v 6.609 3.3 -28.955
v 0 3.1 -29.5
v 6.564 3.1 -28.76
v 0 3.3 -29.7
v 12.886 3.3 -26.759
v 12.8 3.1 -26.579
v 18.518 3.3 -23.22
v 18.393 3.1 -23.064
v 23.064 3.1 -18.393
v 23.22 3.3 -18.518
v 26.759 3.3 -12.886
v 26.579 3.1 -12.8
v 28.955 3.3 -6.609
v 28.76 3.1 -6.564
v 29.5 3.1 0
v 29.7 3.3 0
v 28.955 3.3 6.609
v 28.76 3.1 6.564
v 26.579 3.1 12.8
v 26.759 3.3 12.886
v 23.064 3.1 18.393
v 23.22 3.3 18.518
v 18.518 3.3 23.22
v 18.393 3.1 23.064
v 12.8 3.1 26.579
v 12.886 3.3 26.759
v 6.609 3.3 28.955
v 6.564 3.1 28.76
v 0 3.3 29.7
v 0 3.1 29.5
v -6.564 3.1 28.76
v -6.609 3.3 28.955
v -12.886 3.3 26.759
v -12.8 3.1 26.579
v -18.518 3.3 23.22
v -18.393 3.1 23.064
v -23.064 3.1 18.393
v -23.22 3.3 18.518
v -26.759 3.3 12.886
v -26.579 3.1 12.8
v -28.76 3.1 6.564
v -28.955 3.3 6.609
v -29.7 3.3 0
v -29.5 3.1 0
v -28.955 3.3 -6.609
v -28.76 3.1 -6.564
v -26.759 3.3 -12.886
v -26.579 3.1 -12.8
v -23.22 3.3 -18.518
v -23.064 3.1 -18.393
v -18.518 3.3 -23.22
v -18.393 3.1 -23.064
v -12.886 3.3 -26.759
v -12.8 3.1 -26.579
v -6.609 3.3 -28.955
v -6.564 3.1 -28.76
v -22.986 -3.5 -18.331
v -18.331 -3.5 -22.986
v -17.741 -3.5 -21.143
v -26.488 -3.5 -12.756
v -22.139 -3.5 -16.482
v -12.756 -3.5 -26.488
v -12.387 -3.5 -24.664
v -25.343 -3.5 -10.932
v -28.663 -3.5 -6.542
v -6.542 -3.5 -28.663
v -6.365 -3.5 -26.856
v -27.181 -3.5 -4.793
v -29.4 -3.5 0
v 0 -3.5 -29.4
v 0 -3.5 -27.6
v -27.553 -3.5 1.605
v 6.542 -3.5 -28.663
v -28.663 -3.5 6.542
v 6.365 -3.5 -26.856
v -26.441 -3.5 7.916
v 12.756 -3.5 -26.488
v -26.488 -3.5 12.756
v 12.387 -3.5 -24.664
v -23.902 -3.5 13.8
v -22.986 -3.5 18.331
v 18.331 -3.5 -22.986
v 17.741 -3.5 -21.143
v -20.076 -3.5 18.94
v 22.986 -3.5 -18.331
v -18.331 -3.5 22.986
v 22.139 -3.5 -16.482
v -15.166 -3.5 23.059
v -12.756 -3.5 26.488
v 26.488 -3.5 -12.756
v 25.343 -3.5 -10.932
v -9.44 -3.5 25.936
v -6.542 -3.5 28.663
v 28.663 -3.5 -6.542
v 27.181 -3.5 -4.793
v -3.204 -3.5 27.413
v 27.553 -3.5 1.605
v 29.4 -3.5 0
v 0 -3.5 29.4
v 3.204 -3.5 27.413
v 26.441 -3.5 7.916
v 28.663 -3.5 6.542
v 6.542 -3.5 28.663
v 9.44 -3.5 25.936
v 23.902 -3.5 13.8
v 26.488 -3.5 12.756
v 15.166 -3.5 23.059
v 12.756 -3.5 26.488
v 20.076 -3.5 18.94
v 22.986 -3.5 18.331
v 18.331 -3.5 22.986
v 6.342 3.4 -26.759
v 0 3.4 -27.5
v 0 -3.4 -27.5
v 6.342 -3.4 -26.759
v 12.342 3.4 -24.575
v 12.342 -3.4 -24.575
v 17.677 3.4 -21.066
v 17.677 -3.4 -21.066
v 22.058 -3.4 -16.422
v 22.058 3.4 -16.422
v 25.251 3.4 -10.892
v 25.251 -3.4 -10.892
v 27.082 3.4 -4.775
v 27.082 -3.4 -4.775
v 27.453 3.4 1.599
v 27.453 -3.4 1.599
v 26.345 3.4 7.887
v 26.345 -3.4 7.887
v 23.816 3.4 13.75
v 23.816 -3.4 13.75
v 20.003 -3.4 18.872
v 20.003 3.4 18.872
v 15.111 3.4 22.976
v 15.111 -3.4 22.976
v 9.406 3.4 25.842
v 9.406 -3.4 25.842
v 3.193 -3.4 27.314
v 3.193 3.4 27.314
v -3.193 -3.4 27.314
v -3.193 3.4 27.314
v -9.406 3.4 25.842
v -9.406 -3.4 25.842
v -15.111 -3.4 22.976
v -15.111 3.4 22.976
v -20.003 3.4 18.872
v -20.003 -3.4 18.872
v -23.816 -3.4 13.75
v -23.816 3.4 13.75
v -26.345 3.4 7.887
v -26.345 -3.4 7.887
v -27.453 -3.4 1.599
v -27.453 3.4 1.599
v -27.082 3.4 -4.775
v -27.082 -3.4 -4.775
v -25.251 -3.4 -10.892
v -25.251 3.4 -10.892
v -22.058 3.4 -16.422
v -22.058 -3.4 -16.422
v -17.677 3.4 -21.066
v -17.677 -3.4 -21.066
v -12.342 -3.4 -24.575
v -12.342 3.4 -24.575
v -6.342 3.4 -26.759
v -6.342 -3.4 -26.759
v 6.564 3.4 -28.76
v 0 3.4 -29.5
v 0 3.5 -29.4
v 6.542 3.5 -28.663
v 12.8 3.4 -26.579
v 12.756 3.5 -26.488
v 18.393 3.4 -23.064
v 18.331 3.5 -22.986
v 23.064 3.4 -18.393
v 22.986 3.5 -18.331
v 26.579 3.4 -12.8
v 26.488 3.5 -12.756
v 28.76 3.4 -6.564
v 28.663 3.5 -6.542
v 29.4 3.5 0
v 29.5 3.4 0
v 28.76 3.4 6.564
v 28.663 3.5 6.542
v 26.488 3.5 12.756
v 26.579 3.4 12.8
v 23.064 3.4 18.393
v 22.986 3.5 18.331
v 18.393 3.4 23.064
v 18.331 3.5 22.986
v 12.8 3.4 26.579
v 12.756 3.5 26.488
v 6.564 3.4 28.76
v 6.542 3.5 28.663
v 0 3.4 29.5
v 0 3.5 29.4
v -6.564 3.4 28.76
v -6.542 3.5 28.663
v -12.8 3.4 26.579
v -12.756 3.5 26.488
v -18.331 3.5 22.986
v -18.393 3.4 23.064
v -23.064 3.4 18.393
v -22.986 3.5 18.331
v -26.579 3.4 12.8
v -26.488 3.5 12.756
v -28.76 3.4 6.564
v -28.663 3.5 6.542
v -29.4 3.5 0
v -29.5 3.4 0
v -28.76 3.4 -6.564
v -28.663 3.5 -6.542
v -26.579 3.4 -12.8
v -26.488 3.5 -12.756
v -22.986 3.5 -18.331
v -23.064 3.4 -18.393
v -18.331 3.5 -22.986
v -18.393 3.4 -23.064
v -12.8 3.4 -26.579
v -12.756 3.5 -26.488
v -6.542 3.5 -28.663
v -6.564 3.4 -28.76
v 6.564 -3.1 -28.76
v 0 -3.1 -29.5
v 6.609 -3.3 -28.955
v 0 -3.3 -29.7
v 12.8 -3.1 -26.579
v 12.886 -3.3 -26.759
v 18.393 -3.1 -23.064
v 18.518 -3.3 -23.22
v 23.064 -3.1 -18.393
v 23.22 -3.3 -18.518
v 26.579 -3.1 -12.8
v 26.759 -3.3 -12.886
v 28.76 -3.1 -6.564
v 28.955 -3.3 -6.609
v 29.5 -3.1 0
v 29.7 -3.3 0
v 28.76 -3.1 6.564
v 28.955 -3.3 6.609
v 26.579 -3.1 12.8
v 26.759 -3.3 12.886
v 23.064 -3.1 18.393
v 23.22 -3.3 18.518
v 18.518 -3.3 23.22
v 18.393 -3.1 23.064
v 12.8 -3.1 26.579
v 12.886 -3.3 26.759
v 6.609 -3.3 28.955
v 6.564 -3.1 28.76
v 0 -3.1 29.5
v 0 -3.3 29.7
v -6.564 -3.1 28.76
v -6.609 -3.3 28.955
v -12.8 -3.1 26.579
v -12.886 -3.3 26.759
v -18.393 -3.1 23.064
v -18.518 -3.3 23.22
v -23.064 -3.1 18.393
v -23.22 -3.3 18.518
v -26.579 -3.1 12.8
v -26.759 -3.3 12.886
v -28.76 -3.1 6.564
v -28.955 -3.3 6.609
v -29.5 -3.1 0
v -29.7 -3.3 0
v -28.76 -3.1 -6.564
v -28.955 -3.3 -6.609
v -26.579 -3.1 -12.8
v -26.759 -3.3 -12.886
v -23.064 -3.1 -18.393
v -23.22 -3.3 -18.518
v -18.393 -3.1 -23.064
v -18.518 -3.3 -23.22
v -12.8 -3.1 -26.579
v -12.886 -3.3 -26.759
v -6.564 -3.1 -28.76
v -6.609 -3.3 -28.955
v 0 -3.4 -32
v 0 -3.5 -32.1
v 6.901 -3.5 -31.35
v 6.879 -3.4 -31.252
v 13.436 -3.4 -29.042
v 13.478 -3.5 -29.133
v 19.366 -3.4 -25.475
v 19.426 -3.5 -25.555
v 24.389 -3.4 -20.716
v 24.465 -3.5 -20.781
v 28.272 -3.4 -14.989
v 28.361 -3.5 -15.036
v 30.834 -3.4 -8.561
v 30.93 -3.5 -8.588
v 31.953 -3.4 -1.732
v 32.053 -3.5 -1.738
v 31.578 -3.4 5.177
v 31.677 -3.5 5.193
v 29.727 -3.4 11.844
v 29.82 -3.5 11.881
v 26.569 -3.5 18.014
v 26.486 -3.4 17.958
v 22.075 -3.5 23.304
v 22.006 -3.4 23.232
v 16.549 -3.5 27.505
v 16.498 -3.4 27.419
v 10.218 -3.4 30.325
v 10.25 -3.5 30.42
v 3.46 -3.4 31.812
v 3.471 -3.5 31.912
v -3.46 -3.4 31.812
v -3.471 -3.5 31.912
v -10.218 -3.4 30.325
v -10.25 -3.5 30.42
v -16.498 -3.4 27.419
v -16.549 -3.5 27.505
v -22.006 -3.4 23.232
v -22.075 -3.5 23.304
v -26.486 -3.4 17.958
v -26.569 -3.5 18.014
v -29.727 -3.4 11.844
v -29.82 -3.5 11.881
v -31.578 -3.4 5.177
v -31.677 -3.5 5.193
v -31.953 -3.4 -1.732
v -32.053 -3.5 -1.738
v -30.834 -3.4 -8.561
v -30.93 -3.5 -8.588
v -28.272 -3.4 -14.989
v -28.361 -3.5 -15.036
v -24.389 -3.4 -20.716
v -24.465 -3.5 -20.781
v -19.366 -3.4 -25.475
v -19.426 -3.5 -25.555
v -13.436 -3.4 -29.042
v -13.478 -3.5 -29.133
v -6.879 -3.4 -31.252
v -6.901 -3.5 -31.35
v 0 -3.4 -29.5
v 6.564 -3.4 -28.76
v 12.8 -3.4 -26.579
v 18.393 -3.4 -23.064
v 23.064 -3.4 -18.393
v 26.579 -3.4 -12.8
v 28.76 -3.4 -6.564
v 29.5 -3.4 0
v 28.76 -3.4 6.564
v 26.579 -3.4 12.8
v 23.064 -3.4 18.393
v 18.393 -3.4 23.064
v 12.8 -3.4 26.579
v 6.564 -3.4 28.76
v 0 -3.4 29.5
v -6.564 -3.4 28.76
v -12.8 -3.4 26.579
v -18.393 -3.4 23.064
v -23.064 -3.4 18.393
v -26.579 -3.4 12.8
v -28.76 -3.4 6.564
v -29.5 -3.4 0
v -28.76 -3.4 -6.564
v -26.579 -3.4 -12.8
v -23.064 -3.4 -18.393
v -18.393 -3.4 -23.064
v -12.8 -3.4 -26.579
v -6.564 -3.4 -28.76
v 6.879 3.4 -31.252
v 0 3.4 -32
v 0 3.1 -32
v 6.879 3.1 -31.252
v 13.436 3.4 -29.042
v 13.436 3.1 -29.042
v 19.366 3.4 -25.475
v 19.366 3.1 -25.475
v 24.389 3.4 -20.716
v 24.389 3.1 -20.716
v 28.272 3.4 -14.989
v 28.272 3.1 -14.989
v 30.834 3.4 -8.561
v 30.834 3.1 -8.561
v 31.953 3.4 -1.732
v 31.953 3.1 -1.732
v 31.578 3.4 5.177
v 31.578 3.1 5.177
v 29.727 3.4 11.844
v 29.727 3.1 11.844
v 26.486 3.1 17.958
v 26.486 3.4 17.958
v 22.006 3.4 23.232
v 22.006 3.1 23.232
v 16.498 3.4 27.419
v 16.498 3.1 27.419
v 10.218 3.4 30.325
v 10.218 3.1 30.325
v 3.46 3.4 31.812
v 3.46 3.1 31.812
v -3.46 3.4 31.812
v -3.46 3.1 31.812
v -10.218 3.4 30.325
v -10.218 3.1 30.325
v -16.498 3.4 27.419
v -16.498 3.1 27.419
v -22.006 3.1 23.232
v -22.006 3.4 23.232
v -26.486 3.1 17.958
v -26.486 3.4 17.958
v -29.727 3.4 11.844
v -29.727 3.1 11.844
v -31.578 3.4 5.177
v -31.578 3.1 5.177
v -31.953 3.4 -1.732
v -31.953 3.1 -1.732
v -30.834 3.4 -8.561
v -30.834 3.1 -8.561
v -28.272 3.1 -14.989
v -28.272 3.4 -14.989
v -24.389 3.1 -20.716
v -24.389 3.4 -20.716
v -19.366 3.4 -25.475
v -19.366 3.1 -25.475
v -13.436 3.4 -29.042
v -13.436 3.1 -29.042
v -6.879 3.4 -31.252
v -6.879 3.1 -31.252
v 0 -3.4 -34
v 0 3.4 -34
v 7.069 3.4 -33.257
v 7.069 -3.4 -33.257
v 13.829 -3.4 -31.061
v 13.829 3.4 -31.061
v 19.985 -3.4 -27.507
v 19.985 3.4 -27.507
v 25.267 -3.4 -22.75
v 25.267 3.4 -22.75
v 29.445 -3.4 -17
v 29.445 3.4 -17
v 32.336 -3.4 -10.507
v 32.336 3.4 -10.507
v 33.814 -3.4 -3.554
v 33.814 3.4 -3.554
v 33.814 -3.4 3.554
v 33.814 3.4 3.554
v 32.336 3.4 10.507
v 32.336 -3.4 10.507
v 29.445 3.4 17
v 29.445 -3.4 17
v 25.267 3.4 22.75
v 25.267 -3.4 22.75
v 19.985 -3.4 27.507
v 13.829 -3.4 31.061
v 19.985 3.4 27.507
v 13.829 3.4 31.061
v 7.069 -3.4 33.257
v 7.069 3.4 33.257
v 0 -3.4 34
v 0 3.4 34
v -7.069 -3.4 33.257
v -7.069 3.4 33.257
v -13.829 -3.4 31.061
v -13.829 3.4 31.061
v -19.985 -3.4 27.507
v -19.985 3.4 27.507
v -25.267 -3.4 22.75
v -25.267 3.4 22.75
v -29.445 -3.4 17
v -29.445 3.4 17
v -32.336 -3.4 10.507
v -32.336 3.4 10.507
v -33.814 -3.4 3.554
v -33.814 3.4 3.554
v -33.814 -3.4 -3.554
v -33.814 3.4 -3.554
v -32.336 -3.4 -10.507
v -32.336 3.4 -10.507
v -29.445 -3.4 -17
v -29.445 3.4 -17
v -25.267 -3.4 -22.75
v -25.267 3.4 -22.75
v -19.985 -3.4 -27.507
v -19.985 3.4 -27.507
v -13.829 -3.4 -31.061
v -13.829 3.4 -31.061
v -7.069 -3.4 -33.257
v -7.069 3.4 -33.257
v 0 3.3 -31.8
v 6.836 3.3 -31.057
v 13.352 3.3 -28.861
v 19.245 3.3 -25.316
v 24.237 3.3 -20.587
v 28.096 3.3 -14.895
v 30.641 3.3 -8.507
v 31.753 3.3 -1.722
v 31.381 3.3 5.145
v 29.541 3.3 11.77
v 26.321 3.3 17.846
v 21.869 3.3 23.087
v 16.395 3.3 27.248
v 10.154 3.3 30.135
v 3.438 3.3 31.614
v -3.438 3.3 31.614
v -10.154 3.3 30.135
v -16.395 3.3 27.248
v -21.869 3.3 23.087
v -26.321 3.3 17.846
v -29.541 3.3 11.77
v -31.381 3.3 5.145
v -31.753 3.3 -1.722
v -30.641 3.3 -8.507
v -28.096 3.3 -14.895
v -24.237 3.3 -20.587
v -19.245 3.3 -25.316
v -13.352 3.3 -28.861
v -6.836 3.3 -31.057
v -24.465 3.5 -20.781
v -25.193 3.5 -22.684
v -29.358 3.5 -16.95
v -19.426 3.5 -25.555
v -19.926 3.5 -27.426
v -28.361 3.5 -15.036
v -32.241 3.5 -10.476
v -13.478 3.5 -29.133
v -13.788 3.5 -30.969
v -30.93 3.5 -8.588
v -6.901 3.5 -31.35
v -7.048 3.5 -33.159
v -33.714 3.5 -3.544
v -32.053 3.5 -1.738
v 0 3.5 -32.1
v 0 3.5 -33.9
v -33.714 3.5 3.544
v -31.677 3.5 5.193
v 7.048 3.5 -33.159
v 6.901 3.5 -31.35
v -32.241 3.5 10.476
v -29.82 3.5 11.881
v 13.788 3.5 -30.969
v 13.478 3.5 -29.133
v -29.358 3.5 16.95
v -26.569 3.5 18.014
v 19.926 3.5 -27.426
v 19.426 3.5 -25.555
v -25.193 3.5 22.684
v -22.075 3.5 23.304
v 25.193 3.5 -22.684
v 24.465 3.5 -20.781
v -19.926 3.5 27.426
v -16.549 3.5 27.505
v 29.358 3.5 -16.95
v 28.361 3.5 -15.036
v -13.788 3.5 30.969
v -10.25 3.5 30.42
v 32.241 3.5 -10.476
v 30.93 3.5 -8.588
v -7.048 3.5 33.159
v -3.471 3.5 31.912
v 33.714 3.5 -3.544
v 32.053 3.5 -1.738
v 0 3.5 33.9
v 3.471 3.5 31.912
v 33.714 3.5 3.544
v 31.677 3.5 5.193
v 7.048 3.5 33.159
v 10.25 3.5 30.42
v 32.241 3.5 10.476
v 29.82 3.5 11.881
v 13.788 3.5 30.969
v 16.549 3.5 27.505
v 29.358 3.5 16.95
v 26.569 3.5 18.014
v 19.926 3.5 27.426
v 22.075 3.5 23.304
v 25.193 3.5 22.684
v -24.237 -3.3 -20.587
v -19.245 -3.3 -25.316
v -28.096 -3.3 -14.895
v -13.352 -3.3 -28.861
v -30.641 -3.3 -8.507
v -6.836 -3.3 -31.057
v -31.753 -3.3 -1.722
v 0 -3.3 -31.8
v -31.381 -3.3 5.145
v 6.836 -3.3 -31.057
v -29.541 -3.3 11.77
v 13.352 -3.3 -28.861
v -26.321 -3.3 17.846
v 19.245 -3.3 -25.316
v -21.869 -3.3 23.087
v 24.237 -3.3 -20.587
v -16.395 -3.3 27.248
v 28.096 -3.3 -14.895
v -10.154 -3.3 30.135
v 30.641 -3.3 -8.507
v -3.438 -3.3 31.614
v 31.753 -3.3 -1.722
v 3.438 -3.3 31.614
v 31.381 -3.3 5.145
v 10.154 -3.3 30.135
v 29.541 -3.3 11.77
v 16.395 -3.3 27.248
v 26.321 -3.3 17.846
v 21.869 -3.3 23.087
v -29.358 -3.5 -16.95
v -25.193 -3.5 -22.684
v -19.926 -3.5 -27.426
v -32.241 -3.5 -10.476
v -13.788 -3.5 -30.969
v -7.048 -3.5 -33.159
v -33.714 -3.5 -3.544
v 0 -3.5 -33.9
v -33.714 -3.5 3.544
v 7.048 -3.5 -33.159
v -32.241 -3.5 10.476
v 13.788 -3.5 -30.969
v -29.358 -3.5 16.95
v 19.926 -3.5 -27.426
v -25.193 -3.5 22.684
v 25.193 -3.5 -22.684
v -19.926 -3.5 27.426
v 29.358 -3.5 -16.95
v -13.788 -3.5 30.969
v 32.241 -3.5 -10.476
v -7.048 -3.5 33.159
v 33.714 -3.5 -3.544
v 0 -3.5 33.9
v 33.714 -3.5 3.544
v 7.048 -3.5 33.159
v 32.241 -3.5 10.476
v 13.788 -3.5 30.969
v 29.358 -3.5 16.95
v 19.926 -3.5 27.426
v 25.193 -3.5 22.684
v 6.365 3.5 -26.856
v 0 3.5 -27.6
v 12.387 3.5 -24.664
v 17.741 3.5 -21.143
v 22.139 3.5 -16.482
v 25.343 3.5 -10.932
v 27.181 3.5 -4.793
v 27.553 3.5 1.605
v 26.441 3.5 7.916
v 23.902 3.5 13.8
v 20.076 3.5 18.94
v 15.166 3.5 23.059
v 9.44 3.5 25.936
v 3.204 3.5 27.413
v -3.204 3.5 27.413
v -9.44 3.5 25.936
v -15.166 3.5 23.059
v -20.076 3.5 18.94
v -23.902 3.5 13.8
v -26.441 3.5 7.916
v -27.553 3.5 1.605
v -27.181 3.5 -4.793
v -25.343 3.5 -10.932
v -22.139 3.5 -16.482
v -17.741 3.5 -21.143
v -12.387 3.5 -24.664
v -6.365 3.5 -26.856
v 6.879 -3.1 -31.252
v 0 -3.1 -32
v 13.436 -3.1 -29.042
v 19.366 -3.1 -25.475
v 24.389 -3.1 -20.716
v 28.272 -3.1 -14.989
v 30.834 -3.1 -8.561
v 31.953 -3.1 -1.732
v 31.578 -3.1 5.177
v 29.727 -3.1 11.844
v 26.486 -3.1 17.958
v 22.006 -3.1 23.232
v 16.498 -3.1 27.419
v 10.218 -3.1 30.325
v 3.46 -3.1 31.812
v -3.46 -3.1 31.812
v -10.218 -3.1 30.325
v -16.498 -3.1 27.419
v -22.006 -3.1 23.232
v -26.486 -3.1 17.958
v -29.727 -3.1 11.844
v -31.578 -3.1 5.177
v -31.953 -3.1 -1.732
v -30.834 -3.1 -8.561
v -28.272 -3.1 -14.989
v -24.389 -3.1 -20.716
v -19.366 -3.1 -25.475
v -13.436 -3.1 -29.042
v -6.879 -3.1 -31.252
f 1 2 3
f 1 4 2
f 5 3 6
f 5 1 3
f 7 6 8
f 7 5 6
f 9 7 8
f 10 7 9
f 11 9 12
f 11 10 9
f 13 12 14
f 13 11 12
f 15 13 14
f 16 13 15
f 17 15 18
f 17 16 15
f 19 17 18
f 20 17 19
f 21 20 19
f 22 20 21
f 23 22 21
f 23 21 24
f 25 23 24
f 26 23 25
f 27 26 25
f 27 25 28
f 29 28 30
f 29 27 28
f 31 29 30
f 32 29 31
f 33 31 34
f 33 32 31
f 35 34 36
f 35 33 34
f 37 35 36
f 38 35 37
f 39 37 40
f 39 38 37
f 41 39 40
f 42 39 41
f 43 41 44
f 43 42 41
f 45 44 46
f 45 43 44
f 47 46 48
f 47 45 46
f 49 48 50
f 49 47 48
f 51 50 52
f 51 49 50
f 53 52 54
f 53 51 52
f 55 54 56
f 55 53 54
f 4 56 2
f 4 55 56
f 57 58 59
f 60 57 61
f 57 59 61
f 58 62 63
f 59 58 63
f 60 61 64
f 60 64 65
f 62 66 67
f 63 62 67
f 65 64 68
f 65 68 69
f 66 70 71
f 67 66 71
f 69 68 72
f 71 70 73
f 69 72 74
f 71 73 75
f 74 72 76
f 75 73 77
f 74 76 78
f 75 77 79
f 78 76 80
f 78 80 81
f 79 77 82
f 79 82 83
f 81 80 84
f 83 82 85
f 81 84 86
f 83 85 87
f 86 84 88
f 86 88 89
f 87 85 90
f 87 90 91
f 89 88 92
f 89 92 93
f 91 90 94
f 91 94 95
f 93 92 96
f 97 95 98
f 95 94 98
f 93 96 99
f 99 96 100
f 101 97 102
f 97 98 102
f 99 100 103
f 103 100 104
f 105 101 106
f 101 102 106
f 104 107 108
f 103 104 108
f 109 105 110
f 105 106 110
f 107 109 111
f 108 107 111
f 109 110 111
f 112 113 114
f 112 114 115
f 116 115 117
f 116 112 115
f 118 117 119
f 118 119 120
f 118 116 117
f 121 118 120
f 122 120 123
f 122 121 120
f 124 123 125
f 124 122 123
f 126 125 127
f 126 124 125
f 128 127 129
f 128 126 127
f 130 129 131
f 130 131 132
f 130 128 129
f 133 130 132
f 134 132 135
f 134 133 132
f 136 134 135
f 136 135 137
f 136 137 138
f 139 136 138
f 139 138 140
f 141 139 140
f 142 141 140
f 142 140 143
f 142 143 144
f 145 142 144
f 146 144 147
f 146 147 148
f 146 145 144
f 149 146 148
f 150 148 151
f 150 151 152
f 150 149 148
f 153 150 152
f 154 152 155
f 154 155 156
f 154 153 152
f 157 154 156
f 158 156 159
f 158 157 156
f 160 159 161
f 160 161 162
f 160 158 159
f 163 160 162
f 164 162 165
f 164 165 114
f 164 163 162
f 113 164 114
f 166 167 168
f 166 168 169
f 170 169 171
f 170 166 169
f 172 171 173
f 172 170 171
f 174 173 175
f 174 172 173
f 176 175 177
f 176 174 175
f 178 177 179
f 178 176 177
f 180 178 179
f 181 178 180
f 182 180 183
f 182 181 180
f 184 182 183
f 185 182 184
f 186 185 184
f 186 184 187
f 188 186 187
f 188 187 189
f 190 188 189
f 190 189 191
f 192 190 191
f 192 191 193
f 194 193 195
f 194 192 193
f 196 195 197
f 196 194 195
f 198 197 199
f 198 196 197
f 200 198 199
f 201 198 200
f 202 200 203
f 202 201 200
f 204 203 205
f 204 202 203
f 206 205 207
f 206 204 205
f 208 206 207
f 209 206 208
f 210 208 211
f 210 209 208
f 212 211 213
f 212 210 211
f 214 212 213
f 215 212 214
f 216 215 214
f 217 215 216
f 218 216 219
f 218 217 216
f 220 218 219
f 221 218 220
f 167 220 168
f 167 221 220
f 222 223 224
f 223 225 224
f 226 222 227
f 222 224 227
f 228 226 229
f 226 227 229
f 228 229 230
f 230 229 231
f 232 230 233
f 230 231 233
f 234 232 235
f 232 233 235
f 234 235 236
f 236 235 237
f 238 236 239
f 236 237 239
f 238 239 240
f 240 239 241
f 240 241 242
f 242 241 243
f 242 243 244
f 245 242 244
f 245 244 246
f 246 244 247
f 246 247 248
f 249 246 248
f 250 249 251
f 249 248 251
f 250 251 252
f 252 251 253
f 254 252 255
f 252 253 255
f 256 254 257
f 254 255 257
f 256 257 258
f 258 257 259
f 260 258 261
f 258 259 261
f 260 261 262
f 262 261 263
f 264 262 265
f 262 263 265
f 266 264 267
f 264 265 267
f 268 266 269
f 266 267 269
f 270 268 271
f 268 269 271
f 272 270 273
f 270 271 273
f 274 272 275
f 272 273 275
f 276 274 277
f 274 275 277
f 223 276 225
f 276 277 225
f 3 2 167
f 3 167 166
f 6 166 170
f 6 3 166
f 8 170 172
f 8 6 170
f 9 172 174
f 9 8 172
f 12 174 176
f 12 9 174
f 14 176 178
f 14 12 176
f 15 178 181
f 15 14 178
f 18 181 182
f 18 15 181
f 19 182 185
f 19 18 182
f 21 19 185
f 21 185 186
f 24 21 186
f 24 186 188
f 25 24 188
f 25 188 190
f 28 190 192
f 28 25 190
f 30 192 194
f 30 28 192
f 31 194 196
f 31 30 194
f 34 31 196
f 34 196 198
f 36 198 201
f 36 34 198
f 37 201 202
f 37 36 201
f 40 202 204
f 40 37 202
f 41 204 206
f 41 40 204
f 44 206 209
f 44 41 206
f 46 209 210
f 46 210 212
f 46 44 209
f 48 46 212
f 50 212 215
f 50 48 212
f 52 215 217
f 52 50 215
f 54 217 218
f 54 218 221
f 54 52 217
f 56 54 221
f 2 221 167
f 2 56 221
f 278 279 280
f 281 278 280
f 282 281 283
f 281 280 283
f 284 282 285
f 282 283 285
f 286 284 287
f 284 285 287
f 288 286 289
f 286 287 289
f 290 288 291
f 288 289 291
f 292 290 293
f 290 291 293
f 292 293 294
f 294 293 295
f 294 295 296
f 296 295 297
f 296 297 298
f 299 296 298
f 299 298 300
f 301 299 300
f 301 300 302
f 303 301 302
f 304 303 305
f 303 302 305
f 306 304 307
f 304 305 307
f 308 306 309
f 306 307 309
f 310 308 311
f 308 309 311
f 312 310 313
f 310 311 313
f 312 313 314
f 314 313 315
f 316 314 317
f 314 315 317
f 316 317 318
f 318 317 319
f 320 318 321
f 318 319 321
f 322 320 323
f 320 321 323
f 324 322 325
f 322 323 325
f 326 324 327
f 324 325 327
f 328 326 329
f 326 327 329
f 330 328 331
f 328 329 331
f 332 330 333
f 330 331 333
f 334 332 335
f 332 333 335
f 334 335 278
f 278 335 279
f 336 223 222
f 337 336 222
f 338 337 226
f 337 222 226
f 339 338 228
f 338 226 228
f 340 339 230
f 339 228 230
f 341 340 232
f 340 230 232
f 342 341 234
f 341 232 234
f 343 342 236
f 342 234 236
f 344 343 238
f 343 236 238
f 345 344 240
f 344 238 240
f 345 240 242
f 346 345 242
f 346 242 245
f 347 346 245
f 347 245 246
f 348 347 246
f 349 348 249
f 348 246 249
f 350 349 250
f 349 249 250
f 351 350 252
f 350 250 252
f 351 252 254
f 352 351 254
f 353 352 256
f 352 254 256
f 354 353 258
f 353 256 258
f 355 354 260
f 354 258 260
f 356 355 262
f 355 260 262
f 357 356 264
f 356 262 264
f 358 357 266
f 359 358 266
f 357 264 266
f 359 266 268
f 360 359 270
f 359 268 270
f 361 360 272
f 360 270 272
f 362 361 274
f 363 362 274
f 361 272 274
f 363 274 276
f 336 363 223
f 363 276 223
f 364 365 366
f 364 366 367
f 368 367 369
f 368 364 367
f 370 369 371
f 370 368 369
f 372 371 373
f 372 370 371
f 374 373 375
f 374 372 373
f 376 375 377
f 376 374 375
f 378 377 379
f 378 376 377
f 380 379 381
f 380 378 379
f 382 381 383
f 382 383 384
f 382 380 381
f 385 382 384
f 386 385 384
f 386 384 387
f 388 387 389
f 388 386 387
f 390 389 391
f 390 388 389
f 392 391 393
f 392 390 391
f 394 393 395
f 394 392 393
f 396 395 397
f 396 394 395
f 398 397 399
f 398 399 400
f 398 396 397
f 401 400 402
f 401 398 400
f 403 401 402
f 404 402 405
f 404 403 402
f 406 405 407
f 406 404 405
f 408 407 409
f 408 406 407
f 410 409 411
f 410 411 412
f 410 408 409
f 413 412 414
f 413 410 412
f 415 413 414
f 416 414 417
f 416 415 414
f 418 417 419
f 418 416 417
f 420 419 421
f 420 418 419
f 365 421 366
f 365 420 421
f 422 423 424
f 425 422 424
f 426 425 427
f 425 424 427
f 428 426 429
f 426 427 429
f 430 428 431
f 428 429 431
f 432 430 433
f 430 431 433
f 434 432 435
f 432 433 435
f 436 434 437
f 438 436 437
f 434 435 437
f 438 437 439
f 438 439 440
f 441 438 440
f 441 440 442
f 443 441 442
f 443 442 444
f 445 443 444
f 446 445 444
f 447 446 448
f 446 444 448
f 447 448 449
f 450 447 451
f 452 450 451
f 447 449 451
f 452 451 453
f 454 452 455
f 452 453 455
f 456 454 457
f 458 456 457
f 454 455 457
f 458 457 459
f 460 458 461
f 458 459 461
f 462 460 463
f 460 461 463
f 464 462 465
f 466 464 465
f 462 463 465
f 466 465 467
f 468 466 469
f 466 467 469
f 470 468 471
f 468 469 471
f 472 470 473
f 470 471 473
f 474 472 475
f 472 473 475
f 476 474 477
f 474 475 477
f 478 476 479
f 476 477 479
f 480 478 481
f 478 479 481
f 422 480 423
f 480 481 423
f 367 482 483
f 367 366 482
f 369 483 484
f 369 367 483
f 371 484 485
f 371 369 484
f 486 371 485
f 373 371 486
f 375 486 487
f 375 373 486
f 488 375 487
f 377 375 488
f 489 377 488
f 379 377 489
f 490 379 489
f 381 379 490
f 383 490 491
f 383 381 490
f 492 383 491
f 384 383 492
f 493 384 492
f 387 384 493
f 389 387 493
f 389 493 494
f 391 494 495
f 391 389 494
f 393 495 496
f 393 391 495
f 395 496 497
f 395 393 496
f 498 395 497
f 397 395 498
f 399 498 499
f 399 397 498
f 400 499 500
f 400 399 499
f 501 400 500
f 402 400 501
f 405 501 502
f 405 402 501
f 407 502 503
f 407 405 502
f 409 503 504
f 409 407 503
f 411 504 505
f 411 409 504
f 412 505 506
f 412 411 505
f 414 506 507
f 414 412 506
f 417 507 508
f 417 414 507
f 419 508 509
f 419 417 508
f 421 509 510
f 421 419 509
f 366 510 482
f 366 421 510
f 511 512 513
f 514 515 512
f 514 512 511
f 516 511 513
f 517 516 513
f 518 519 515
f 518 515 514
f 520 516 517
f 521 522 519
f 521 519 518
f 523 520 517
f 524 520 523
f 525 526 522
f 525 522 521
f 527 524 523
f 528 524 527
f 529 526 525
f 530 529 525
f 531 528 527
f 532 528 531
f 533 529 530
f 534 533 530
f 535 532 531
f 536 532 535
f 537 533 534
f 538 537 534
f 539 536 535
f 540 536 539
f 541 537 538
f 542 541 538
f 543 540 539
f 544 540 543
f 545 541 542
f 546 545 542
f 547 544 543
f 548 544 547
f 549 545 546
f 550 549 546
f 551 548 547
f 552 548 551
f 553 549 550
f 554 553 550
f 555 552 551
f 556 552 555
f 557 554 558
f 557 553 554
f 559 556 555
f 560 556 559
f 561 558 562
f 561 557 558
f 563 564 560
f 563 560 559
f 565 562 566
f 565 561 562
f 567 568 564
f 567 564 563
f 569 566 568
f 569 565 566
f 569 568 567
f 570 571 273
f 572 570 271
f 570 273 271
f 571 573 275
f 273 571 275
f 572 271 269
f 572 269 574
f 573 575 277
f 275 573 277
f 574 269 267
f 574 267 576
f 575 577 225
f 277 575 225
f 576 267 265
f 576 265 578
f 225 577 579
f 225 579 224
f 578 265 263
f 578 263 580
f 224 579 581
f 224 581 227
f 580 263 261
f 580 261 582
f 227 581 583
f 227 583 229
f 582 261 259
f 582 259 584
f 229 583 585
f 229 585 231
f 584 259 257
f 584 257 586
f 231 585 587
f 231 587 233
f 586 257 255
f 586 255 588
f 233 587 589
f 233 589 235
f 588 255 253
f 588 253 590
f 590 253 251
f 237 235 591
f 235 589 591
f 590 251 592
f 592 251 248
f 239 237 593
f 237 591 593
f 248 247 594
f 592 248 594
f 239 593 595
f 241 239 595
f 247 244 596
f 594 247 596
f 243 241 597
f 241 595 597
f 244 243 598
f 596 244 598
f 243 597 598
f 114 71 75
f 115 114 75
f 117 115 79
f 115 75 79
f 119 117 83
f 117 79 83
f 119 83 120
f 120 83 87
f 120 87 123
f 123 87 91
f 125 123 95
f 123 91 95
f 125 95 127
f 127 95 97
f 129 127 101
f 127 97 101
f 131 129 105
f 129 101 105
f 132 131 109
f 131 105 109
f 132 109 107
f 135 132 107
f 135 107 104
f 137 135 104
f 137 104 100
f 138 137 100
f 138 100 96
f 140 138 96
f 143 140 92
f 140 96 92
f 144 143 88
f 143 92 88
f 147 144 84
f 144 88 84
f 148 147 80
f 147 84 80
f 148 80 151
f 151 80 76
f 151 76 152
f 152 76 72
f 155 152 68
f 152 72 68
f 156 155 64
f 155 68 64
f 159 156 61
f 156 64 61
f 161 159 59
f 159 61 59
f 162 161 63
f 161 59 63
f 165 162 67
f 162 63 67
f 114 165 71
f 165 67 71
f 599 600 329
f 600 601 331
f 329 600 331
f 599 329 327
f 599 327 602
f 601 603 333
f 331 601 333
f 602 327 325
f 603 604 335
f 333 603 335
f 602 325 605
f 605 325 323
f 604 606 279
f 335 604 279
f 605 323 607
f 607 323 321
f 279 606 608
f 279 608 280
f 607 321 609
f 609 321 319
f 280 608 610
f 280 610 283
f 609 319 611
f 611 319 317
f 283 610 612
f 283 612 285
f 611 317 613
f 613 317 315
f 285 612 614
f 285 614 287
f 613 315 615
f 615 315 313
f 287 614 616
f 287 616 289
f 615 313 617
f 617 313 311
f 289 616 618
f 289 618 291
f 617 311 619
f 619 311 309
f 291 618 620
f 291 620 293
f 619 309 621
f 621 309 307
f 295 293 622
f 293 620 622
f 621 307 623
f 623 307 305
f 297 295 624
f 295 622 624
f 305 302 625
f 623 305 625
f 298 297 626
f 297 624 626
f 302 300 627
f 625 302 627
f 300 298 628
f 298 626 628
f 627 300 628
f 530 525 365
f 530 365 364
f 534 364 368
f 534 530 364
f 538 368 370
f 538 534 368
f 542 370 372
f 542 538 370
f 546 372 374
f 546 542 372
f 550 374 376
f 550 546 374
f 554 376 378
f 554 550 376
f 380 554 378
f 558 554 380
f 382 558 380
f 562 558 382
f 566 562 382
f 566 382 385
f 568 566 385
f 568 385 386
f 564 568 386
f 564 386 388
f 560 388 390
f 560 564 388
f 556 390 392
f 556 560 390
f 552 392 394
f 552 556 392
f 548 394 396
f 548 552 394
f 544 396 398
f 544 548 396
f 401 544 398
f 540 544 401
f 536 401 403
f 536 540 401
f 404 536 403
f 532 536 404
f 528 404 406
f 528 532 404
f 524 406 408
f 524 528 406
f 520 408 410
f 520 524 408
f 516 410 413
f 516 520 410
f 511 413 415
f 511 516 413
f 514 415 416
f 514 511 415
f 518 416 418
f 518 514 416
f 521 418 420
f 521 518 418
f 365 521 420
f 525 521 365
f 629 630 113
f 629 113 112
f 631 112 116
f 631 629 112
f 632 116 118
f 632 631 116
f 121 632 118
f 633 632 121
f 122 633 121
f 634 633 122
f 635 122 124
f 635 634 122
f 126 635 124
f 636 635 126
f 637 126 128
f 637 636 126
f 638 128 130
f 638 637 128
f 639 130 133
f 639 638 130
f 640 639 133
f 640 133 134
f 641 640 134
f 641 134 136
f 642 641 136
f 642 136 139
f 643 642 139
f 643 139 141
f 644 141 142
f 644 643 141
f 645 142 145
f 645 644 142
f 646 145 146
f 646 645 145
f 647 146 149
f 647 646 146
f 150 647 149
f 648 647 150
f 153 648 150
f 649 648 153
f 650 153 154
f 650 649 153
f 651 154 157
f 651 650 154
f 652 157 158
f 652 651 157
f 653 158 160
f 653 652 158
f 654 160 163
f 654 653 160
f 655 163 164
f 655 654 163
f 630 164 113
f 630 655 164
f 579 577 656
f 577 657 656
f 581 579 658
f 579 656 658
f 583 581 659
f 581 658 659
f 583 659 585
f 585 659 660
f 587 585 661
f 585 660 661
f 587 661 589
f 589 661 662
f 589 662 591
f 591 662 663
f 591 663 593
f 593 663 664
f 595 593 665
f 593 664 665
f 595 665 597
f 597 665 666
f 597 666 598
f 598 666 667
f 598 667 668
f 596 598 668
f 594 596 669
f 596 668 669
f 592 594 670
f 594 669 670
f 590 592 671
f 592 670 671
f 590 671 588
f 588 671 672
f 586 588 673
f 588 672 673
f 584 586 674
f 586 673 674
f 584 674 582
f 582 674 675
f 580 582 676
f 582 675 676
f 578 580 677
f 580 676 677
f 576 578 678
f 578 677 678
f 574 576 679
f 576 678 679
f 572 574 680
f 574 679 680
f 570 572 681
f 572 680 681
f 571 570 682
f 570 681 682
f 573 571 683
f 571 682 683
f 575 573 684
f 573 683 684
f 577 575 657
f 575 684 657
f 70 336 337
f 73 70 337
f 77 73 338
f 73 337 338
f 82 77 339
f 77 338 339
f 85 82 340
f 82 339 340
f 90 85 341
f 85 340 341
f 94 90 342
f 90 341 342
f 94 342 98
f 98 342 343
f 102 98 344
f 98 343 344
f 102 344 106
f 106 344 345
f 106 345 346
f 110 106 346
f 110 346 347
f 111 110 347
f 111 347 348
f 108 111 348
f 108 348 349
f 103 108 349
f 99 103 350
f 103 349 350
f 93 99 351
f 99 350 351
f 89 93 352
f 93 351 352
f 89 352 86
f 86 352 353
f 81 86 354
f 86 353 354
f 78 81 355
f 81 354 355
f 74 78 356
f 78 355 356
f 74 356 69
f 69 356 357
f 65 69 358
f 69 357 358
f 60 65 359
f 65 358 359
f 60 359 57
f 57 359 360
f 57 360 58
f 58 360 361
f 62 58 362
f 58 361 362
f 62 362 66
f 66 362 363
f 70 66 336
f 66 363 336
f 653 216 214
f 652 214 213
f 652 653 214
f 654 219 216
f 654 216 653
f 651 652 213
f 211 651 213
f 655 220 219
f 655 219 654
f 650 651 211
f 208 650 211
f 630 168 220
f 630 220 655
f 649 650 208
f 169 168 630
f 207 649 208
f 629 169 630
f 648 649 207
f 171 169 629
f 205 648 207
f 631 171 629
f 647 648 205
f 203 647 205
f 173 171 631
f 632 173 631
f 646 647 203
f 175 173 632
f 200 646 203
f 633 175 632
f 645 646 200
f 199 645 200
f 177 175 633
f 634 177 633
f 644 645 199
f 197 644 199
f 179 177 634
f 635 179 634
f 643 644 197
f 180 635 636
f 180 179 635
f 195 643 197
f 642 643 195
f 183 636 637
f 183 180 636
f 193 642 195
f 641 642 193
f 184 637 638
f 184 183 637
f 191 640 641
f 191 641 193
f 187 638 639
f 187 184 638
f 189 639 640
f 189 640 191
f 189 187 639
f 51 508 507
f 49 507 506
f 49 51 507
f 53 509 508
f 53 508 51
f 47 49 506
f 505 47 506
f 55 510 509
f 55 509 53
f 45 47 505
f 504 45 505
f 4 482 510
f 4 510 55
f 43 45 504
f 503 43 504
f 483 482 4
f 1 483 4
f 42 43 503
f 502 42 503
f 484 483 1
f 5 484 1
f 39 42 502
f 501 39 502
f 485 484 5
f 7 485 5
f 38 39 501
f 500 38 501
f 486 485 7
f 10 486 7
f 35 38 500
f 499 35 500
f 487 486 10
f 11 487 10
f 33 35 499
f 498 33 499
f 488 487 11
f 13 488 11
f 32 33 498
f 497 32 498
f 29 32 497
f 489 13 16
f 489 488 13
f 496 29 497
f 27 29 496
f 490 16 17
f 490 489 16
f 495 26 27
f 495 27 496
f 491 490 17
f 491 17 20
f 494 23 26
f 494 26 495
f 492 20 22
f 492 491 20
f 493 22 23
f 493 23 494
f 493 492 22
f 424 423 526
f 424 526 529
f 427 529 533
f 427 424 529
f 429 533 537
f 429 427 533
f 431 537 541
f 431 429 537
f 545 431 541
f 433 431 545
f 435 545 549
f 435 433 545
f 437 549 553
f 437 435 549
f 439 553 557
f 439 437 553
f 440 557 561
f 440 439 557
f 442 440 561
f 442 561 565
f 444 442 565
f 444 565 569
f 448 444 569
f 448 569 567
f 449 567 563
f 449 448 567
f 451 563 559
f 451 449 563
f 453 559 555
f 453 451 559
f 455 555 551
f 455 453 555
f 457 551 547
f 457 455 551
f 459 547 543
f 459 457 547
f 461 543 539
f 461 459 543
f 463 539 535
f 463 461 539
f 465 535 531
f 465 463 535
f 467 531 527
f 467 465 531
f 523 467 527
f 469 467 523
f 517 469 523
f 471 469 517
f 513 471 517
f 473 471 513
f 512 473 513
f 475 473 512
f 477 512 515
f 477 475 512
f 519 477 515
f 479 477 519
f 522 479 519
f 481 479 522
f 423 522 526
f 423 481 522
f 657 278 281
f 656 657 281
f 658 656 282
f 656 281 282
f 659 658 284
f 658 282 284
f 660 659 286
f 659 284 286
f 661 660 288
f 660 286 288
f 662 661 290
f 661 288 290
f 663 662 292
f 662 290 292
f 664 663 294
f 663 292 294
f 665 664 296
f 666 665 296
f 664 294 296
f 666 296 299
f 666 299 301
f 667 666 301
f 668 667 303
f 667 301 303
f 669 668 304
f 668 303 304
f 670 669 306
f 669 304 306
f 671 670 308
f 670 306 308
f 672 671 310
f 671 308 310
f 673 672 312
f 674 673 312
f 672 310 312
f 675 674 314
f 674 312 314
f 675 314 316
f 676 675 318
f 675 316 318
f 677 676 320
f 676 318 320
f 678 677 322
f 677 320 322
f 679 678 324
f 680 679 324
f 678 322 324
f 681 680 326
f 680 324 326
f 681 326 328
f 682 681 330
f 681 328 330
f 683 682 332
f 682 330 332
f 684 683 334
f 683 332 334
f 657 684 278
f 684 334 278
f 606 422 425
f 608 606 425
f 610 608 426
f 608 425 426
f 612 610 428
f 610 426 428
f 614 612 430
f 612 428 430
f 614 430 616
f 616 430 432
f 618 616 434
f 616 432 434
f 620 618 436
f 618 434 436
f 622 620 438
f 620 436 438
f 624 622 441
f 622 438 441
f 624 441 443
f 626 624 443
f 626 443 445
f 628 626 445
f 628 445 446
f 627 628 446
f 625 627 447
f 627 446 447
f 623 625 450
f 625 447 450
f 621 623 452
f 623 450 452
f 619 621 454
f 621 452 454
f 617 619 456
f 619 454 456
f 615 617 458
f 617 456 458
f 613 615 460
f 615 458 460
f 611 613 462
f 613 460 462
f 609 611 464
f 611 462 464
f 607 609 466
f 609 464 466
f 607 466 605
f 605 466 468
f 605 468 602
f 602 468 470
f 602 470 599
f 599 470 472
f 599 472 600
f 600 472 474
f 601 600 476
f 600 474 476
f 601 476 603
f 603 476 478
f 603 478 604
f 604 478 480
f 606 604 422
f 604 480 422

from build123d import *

# Parameters (mm, degrees)
SKETCH1_W     = 6.5
SKETCH1_H     = 7
CHAMFER1_SIZE = 0.1


with BuildPart() as part:
    # Sketch1 → Revolve1 (revolve)
    with BuildSketch(Plane(origin=(0, 0, 0), x_dir=(0, 0, -1), z_dir=(1, 0, 0))):
        with Locations((30.75, 0)):
            Rectangle(SKETCH1_W, SKETCH1_H)
    revolve(axis=Axis((0, 3.5, 0), (0, -1, 0)))

    # Sketch3 → Cut-Revolve2 (revolve, cut)
    with BuildSketch(Plane(origin=(0, 0, 0), x_dir=(0, 0, -1), z_dir=(1, 0, 0))):
        Polygon((31.8, 3.3), (32, 3.1), (32, 3.5), (29.5, 3.5), (29.5, 3.1), (29.7, 3.3), align=None)
    cut_revolve2 = revolve(axis=Axis((0, 3.5, 0), (0, -1, 0)), mode=Mode.SUBTRACT)

    # Mirror1: Cut-Revolve2 across plane
    add(cut_revolve2.mirror(Plane.ZX), mode=Mode.SUBTRACT)

    # Chamfer1
    chamfer1_edges = [part.edges().sort_by_distance(p)[0] for p in [
        (0, 3.5, 32),
        (0, 3.5, 29.5),
        (0, -3.5, 32),
        (0, -3.5, 29.5),
        (0, 3.5, 34),
        (0, -3.5, 34),
        (0, -3.5, 27.5),
        (0, 3.5, 27.5),
    ]]
    chamfer(chamfer1_edges, length=CHAMFER1_SIZE)


solid = part.part
